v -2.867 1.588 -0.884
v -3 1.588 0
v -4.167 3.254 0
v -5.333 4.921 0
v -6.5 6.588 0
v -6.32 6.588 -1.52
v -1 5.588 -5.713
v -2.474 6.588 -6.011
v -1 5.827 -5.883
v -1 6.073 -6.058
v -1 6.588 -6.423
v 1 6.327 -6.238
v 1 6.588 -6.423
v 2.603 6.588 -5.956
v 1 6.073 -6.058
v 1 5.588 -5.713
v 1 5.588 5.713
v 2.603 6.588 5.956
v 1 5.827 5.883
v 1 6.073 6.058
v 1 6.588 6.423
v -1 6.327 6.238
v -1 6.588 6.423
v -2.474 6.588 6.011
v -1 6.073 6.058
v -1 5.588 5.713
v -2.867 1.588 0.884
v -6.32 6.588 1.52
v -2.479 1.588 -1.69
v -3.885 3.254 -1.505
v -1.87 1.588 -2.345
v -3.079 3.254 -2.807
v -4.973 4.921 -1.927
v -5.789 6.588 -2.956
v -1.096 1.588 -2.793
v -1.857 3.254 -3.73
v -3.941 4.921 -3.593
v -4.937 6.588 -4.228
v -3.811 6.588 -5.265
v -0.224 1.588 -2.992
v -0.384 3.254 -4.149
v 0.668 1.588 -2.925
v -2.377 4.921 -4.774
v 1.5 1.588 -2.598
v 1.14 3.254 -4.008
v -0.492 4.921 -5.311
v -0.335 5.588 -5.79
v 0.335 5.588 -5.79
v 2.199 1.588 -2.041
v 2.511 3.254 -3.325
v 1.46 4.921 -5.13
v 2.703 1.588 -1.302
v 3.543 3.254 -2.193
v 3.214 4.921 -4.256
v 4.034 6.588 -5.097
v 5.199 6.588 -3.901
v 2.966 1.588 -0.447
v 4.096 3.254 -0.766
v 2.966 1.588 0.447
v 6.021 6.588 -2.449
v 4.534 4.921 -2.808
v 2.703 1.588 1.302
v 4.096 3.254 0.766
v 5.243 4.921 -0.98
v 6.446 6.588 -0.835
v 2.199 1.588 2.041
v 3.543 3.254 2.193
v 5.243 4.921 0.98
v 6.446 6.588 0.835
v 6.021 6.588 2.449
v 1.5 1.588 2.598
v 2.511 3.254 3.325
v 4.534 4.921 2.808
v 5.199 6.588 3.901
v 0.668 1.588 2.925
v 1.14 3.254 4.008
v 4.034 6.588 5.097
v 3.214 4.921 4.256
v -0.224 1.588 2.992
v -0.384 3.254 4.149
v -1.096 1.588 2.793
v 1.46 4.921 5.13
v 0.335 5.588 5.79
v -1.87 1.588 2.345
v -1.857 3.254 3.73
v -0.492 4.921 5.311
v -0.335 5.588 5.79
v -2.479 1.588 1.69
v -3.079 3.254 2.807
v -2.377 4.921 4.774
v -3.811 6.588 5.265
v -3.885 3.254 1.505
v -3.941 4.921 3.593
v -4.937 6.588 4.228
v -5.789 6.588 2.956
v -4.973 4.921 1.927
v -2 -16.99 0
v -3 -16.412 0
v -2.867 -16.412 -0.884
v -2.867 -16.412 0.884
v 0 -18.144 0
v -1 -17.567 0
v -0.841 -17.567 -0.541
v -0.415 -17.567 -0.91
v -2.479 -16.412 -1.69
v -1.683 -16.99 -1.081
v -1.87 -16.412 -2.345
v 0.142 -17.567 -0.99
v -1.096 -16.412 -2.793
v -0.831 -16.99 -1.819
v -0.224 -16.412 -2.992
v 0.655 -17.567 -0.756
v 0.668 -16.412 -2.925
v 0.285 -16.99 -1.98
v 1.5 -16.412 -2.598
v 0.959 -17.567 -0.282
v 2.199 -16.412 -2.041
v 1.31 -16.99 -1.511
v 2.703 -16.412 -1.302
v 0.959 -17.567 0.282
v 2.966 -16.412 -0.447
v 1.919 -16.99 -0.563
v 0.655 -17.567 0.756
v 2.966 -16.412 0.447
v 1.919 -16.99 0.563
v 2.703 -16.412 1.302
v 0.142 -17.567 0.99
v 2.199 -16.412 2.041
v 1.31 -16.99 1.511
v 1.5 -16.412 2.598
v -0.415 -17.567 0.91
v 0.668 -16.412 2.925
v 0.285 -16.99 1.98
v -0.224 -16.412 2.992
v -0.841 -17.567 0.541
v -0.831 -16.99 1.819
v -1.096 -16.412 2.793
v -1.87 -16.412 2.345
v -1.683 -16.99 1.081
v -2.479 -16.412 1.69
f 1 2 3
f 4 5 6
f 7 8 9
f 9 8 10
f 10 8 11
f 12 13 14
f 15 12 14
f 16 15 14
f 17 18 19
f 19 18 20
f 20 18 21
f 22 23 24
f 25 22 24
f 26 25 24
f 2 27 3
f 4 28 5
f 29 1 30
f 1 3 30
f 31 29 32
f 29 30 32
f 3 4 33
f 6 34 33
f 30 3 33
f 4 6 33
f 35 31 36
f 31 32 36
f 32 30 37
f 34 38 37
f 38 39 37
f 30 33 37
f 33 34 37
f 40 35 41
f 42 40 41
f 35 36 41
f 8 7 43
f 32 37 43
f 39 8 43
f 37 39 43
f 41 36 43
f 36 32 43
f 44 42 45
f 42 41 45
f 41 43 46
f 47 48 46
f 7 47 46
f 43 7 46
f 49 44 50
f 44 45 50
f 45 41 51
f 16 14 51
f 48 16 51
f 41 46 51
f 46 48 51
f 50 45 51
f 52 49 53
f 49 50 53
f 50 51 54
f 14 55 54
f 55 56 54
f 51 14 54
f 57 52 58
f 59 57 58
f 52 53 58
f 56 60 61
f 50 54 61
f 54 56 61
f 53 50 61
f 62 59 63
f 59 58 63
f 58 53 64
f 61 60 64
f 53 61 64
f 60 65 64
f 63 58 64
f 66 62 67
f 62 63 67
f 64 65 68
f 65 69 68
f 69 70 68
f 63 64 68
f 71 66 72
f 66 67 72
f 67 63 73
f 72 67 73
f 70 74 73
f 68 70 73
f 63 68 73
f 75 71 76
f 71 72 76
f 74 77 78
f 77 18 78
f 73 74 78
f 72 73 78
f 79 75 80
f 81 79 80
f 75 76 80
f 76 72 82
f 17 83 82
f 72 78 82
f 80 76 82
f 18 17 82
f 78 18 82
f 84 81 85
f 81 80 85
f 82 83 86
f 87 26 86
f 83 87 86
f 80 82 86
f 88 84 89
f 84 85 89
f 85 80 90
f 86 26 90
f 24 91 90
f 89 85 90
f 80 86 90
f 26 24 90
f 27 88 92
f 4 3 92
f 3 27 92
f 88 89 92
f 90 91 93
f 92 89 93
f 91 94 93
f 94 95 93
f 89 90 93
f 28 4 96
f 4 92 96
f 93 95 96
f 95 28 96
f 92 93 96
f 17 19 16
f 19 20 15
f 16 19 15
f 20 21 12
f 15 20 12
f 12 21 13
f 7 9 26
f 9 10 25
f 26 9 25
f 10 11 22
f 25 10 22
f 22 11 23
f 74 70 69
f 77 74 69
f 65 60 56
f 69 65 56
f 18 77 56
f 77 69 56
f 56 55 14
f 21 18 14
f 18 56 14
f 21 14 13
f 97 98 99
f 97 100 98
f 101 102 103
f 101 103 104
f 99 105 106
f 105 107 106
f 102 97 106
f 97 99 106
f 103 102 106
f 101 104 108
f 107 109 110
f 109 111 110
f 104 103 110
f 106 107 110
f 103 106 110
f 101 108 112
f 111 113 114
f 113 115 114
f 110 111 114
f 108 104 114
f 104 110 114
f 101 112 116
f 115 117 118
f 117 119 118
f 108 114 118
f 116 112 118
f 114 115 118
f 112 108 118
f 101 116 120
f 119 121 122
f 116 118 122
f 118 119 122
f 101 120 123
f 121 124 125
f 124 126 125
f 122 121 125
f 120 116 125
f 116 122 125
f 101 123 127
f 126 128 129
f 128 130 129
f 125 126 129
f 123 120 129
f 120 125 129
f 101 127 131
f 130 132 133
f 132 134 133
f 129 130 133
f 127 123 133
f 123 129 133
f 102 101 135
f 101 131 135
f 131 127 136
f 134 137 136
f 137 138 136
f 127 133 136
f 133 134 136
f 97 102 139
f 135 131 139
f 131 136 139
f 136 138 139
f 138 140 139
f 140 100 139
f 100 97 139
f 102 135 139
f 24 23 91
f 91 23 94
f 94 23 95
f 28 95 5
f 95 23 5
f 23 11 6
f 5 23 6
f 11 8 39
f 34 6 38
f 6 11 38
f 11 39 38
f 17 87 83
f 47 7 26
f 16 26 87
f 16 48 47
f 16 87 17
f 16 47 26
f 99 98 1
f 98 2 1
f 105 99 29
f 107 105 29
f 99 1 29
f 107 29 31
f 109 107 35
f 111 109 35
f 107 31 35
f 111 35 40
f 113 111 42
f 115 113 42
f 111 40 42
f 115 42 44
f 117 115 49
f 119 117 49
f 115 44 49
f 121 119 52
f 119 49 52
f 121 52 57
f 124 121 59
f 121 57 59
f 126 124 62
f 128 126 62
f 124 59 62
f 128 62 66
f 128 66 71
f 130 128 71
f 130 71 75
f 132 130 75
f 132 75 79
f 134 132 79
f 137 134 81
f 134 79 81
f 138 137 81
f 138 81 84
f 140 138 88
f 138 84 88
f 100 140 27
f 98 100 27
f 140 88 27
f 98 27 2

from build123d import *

# Parameters (mm, degrees)
CUT_EXTRUDE2_DEPTH = 1


with BuildPart() as part:
    # Sketch2 → Revolve1 (revolve)
    with BuildSketch(Plane.XY, mode=Mode.PRIVATE) as revolve1_sk:
        Polygon((0, -16.412300512), (0, -18.14435132), (3, -16.412300512), (3, 1.587699488), (6.5, 6.587699488), (0, 6.587699488), align=None)
    revolve(revolve1_sk.sketch.rotate(Axis((0, 6.587699488, 0), (0, -1, 0)), 180), axis=Axis((0, 6.587699488, 0), (0, -1, 0)))

    # Sketch4 → Cut-Extrude2 (cut)
    with BuildSketch(Plane(origin=(0, 6.587699488, 0), x_dir=(1, 0, 0), z_dir=(0, 1, 0))):
        Polygon((-1, 6.422616289), (-1, -6.422616289), (-1, -6.622896644), (1, -6.622896644), (1, -6.422616289), (1, 6.422616289), (1, 6.986214166), (-1, 6.986214166), align=None)
    extrude(amount=-CUT_EXTRUDE2_DEPTH, mode=Mode.SUBTRACT)


solid = part.part
